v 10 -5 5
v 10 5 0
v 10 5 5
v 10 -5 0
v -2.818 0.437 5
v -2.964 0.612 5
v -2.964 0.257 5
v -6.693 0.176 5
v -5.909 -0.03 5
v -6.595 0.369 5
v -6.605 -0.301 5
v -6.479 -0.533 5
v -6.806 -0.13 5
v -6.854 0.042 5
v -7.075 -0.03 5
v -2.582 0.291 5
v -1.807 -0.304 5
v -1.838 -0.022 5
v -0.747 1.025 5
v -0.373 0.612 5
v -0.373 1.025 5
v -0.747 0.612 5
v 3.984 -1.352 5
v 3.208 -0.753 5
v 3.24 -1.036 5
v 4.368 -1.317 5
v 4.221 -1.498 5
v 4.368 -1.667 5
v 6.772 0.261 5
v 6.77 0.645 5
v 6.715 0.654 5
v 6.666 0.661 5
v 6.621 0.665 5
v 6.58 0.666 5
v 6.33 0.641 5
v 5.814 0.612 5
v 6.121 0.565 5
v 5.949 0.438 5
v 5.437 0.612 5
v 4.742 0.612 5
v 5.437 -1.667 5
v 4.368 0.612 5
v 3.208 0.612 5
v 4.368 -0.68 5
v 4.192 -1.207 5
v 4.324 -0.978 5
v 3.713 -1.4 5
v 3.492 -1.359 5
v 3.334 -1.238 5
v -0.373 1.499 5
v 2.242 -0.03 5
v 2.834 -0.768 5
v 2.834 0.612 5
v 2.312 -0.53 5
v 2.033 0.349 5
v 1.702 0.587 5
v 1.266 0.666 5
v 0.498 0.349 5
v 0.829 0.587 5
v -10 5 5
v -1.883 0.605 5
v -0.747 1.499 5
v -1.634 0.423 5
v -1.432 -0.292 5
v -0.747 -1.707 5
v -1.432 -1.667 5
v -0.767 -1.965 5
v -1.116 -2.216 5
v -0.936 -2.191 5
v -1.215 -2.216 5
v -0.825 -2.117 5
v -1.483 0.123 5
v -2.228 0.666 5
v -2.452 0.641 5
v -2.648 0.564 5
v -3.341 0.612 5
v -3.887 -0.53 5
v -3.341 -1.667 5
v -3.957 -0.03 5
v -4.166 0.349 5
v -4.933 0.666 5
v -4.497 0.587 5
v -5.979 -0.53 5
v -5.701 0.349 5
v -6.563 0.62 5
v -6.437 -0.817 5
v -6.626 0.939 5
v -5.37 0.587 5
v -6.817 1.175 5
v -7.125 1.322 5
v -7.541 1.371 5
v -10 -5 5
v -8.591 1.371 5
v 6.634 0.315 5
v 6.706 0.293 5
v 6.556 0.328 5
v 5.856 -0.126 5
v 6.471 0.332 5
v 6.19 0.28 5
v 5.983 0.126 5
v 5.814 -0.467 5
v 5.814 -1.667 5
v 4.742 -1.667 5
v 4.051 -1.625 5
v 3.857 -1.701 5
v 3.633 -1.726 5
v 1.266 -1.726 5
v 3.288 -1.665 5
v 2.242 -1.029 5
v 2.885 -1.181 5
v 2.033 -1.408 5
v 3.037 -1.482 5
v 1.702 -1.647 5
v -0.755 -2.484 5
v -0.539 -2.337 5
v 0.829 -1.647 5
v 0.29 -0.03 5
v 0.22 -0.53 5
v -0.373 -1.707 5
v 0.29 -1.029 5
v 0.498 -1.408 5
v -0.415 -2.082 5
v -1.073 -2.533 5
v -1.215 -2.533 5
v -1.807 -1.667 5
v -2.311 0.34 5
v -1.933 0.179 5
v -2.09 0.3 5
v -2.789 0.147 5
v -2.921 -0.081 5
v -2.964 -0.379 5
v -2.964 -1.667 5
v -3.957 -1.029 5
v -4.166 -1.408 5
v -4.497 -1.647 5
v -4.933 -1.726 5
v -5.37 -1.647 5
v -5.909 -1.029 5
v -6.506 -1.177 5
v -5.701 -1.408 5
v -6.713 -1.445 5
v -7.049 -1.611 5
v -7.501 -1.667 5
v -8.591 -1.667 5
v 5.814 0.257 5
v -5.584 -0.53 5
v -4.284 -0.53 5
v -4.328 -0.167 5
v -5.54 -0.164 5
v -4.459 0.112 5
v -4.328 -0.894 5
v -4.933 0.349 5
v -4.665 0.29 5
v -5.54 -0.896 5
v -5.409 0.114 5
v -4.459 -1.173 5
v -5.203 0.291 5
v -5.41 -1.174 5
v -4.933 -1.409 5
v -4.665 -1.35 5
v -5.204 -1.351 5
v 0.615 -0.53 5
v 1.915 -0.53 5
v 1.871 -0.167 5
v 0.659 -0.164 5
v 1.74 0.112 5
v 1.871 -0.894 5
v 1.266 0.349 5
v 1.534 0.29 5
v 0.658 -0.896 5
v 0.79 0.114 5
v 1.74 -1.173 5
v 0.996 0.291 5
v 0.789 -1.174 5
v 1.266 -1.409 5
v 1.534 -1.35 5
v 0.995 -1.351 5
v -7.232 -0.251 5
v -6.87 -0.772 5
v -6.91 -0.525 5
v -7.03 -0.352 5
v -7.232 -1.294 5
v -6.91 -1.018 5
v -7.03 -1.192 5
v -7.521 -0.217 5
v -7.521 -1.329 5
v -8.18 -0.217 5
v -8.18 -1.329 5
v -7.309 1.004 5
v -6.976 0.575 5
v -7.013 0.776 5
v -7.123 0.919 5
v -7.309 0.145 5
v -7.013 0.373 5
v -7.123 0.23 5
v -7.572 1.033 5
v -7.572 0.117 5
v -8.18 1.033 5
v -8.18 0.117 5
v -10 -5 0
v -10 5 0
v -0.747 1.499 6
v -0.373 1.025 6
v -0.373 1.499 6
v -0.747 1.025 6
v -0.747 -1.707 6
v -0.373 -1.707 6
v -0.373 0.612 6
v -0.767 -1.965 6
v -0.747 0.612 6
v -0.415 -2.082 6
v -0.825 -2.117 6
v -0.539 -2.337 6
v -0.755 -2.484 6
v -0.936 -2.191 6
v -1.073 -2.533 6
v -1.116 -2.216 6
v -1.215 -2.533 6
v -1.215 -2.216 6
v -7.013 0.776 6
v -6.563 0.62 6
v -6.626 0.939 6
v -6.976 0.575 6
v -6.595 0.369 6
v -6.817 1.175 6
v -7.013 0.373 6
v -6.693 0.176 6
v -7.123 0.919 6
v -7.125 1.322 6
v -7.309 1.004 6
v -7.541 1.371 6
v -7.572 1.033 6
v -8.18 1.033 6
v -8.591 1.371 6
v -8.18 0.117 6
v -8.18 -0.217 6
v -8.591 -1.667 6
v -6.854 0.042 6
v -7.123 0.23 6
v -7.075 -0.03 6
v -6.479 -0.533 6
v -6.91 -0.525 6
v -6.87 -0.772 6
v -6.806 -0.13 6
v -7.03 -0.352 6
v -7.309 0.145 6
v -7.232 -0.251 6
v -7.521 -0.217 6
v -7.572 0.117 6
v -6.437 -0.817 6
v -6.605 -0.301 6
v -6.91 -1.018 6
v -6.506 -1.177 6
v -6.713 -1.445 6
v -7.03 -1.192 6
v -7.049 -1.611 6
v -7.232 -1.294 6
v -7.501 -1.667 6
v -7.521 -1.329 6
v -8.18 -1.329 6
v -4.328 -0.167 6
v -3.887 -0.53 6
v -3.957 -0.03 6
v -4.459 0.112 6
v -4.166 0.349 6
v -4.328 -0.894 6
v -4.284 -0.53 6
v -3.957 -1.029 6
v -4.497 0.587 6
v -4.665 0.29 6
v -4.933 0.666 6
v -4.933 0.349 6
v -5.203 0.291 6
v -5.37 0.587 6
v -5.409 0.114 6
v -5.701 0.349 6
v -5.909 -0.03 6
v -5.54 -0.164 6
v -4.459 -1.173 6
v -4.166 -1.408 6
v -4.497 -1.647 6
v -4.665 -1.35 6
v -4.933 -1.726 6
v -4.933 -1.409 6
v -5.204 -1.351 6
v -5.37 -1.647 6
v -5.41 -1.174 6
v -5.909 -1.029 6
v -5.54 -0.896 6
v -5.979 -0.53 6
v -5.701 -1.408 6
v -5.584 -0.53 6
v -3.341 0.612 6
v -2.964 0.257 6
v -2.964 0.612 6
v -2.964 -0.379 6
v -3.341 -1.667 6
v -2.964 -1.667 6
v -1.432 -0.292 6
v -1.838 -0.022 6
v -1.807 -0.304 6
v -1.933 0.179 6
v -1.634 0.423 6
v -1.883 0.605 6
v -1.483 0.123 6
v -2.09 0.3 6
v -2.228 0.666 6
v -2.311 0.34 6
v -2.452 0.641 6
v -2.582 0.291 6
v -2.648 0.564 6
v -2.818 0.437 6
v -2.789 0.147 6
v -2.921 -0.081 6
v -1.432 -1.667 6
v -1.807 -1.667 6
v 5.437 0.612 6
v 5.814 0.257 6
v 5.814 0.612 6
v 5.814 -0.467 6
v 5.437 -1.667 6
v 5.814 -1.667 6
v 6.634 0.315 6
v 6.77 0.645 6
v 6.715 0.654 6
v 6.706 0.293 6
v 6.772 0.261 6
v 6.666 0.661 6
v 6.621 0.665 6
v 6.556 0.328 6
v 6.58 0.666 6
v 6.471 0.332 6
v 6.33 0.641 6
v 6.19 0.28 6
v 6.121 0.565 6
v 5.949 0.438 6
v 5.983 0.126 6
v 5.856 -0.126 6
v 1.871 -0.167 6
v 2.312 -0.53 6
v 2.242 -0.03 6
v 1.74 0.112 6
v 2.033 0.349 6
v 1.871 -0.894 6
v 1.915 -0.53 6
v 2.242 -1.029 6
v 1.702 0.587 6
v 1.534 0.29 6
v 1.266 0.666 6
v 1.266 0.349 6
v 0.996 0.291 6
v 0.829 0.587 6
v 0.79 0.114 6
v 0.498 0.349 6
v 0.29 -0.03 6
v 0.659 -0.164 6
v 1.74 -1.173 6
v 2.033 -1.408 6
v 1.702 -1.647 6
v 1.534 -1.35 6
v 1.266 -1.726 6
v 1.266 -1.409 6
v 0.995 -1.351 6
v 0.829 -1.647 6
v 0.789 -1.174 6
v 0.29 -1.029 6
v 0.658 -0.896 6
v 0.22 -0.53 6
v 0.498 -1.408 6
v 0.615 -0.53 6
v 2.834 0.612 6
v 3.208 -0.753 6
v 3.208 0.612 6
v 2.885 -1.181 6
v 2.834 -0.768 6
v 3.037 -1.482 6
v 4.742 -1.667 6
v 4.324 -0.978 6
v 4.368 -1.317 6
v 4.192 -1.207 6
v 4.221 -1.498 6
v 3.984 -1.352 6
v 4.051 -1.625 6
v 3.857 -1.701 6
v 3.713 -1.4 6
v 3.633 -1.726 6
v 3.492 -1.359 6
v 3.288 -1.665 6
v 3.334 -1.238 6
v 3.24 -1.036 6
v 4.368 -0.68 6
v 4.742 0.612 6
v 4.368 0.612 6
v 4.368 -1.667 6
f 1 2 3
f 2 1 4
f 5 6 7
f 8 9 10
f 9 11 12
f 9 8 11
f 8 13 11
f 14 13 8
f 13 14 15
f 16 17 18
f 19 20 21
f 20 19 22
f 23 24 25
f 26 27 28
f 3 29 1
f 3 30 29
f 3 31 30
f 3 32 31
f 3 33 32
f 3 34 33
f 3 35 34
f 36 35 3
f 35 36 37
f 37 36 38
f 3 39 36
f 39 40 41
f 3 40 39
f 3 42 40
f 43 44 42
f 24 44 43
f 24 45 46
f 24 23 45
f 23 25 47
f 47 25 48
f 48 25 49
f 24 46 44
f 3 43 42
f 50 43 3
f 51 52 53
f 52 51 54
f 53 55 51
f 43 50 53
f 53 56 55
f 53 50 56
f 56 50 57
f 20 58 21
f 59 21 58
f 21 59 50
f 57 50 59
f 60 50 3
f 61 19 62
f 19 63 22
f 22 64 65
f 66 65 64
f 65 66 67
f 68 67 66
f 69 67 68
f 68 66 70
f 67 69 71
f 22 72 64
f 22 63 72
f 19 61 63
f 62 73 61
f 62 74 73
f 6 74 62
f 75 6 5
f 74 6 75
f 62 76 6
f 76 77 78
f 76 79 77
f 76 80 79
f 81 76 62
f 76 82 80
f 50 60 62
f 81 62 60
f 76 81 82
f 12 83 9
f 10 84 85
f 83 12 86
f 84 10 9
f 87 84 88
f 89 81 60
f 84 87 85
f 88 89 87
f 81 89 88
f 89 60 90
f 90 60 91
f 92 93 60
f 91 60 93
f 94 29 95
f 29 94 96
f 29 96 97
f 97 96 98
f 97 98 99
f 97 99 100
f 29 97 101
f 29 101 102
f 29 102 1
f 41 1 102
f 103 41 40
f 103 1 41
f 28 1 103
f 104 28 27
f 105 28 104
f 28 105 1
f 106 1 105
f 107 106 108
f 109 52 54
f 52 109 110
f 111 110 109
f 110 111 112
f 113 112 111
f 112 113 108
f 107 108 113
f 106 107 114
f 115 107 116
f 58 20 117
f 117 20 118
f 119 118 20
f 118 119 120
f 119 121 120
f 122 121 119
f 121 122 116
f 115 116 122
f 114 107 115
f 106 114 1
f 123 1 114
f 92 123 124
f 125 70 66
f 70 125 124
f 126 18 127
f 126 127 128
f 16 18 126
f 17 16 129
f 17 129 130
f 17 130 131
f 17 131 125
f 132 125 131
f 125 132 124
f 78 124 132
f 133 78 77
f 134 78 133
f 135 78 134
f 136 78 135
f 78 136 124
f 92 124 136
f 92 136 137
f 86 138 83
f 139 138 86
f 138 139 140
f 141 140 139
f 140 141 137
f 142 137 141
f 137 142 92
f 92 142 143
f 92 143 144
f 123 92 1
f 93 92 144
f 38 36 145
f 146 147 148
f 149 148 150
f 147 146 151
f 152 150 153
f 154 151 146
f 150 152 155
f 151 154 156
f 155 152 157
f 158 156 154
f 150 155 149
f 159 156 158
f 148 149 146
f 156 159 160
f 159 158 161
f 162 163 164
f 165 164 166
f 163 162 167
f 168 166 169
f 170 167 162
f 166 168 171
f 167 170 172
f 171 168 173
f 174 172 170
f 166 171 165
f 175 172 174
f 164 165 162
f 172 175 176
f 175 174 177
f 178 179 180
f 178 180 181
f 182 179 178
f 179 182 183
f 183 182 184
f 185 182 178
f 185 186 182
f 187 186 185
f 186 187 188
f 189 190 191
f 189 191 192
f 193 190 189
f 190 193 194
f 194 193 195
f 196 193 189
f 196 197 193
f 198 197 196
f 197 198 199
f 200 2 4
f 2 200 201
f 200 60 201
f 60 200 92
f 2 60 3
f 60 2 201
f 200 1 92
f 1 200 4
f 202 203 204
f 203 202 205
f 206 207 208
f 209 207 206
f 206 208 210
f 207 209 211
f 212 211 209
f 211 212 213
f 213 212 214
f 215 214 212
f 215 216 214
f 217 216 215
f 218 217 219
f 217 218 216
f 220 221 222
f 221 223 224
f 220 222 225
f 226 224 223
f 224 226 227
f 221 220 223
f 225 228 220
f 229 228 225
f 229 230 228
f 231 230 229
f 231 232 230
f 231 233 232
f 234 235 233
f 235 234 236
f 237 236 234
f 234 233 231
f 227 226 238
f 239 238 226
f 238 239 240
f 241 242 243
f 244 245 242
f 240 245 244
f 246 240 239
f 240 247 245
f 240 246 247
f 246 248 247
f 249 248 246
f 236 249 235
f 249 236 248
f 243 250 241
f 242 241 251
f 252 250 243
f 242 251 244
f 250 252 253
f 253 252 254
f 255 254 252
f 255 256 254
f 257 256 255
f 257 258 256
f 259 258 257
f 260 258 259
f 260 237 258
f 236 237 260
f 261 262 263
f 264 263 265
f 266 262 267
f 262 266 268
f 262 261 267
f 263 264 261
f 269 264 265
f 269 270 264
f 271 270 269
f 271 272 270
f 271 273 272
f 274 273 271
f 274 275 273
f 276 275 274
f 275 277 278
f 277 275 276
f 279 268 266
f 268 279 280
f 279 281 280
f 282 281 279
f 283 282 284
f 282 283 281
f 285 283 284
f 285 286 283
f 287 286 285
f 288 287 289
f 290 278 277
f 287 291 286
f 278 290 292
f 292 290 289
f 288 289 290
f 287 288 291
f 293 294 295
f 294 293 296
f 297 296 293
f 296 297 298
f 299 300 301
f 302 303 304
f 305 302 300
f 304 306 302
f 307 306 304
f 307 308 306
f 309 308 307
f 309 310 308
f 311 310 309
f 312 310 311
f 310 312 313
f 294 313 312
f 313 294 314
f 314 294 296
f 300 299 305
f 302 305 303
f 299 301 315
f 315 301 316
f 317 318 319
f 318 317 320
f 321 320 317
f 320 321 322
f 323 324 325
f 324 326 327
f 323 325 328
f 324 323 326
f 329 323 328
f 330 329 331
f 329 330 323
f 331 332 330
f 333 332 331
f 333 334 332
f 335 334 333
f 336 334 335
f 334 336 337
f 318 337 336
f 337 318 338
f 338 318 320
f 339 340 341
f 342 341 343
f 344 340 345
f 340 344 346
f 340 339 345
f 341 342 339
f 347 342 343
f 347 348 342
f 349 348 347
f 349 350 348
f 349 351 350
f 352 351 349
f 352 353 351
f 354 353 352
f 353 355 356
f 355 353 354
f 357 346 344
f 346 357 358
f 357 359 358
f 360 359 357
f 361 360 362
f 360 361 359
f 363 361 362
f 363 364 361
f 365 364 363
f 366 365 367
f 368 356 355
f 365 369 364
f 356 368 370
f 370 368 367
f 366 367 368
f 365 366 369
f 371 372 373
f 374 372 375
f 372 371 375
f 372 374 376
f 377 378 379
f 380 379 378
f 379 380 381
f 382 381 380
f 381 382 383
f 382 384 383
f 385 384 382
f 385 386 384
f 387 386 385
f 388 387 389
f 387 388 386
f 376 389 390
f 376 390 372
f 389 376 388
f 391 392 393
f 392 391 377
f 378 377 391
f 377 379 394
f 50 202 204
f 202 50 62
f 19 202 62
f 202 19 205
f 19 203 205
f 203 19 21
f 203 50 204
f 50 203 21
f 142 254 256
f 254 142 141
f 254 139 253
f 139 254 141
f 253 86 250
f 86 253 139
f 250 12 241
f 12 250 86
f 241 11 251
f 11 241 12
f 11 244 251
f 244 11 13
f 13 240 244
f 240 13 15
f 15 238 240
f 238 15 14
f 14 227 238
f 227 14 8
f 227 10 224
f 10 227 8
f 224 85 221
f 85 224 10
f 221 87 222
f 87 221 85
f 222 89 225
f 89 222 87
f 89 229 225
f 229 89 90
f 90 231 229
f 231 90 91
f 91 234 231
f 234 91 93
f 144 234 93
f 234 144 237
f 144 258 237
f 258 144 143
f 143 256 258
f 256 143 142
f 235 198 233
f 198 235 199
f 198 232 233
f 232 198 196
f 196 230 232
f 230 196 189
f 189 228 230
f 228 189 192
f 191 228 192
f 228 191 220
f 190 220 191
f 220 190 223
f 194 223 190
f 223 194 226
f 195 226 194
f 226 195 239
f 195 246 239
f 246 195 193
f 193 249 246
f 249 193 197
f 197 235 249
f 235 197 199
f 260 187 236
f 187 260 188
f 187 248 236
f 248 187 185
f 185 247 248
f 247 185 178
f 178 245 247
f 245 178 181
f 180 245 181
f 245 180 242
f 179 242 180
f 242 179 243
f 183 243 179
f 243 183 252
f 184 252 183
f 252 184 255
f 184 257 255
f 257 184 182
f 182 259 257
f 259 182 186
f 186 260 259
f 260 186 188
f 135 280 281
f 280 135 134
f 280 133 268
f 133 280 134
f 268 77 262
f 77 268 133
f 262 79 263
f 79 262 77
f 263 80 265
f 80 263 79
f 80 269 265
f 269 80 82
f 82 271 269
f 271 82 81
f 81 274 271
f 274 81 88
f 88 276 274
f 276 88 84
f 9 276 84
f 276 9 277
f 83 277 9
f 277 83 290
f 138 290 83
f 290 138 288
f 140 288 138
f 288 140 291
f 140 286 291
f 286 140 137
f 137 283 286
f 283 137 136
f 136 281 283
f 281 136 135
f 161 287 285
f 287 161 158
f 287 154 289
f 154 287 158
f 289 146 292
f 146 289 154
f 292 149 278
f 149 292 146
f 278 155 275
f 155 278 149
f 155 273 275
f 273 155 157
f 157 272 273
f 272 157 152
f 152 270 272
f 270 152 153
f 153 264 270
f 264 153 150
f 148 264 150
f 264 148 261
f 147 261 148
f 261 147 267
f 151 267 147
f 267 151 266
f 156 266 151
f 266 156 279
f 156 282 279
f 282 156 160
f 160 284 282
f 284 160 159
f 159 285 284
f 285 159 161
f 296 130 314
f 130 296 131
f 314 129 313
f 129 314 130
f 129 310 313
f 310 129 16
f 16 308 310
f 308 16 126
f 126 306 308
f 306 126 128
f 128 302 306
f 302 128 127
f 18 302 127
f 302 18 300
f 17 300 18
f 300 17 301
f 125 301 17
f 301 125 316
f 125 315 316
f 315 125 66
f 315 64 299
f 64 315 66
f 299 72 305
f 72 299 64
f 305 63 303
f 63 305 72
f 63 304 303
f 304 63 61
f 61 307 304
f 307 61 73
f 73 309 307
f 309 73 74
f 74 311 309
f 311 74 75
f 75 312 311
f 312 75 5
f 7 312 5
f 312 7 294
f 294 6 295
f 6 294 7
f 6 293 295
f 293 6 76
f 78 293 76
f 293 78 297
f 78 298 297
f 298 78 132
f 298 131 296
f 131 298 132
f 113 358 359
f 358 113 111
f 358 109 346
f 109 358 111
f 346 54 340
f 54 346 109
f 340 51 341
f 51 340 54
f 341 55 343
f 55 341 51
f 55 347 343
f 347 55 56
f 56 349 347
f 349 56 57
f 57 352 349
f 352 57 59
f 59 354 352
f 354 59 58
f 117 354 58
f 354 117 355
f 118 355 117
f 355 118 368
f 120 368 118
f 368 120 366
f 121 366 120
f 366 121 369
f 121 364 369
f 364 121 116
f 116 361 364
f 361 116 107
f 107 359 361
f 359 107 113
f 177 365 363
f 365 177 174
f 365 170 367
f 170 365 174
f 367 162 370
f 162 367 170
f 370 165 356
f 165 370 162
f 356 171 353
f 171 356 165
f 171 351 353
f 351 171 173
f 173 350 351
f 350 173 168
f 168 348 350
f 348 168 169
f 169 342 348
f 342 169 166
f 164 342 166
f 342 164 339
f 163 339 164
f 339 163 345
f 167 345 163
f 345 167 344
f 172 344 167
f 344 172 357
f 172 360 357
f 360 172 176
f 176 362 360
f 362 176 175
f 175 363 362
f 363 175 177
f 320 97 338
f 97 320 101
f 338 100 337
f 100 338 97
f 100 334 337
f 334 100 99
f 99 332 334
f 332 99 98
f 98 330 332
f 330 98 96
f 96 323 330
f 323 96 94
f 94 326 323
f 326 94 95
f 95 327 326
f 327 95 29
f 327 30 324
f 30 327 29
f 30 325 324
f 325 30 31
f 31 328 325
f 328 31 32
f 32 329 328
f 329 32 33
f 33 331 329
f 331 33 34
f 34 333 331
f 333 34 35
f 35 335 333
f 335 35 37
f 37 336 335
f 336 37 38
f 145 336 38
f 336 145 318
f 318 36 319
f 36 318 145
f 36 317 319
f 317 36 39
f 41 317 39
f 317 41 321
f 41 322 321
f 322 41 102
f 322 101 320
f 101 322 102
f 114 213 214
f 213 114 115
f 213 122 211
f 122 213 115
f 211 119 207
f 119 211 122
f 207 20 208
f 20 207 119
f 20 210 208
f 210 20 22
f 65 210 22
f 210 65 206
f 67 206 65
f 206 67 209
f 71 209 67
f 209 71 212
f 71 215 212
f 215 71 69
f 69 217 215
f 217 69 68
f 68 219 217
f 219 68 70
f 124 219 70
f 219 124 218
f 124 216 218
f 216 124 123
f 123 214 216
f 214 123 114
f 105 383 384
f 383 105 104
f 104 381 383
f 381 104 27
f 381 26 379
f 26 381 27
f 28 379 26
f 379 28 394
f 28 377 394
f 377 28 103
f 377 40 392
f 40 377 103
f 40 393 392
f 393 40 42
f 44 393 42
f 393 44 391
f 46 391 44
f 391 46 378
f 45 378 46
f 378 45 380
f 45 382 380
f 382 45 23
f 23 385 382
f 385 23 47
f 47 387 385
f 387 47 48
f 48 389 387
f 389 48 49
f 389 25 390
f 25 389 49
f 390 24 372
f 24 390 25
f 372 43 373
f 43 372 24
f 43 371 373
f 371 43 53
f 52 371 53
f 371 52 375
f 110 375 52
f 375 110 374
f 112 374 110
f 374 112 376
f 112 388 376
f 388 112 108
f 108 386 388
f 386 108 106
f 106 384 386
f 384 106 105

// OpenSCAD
$fn = 10; 
texte_a_inserer = "Bonjour"; 
taille = 3; 
police = "DejaVuSans"; //[[Abril Fatface,Aclonica,Acme,Advent Pro,Akronim,Aladin,Alegreya,Alegreya Sans,Alegreya SC,Alex Brush,Alfa Slab One,Alice,Amaranth,Architects Daughter,Archivo Black,Archivo Narrow,Arimo,Arvo,Asap,Astloch,Asul,Averia Libre,Averia Serif Libre,Bangers,Basic,Belgrano,Berkshire Swash,Bigshot One,Bilbo Swash Caps,Black Ops One,Bonbon,Bowlby One SC,Brawler,Bubblegum Sans,Butterfly Kids,Cabin Condensed,Caesar Dressing,Cagliostro,Calligraffitti,Capriola,Carter One,Changa One,Chango,Chelsea Market,Cherry Cream Soda,Chewy,Chicle,Chivo,Clicker Script,Coming Soon,Concert One,Condiment,Cookie,Courgette,Covered By Your Grace,Crimson Text,Dancing Script,DejaVu Sans,DejaVu Serif,Dhurjati,Doppio One,Dosis,Droid Sans,Eagle Lake,Electrolize,Emilys Candy,Encode Sans,Encode Sans Compressed,Euphoria Script,Exo,Exo 2,Faster One,Federo,Finger Paint,Fjord One,Fontdiner Swanky,Freckle Face,Fruktur,Gabriela,Geo,Germania One,Give You Glory,Gloria Hallelujah,Goudy Bookletter 1911,Graduate,Grand Hotel,Great Vibes,Griffy,Hanalei Fill,Happy Monkey,Henny Penny,Hind,IM Fell English SC,Indie Flower,Irish Grover,Italianno,Jacques Francois Shadow,Jolly Lodger,Josefin Slab,Joti One,Judson,Just Another Hand,Kalam,Kameron,Karma,Kavoon,Knewave,Kranky,Kristi,Laila,Lakki Reddy,Lancelot,Lato,Leckerli One,Ledger,Lekton,Lemon One,Liberation Sans,Libre Caslon Text,Life Savers,Lilita One,Lily Script One,Limelight,Lobster,Lobster Two,Londrina Outline,Londrina Shadow,Londrina Solid,Lora,Love Ya Like A Sister,Loved by the King,Lovers Quarrel,Luckiest Guy,Lusitana,Macondo,Macondo Swash Caps,Mako,Marck Script,Margarine,Marko One,Maven Pro,McLaren,MedievalSharp,Merienda One,Merriweather,Mervale Script,Metal Mania,Metrophobic,Milonga,Miltonian Tattoo,Miss Fajardose,Molle,Montez,Montserrat,Mr De Haviland,Mystery Quest,Neucha,New Rocker,Niconne,Nosifer,Nothing You Could Do,Noto Sans Oriya,Noto Serif,Nova Square,Nunito,Old Standard TT,Oleo Script,Oleo Script Swash Caps,Orbitron,Oregano,Orienta,Original Surfer,Oswald,Over the Rainbow,Overlock,Oxygen,Pacifico,Paprika,Parisienne,Patrick Hand SC,Paytone One,Peralta,Permanent Marker,Piedra,Pirata One,Play,Playball,Poetsen One,Poppins,Press Start 2P,Princess Sofia,PT Mono,Qwigley,Racing Sans One,Raleway,Rancho,Ranga,Ribeye,Roboto,Roboto Condensed,Roboto Slab,Rochester,Rock Salt,Rubik One,Sail,Salsa,Sansita One,Sarina,Satisfy,Schoolbell,Seaweed Script,Sevillana,Shadows Into Light,Shadows Into Light Two,Share,Six Caps,Skranji,Source Sans Pro,Spicy Rice,Stardos Stencil,Stoke,Syncopate,Teko,Terminal Dosis,The Girl Next Door,Tillana,Timmana,Titillium Web,Ubuntu,Ultra,Underdog,UnifrakturCook,UnifrakturMaguntia,Vampiro One,Vidaloka,Viga,Voces,Volkhov,Vollkorn,Voltaire,Waiting for the Sunrise,Wallpoet,Wellfleet,Wendy One,Yellowtail,Yesteryear,Zeyada]]
hauteur = 1; 
longueur_cube = 20; 
largeur_cube = 10; 
hauteur_cube = 5; 
// relief = relief  extrusion = extru
relief = "relief"; //[relief,extru]
module rendu(){
linear_extrude(hauteur) text(texte_a_inserer,size = taille, font = police);
}
module finao(){
if ( relief== "relief") {
   union(){
 translate([0,0,0])   cube([longueur_cube,largeur_cube,hauteur_cube]);
translate([1,(largeur_cube/3),hauteur_cube]) rendu();
   } 
}
else
{
difference(){
 translate([0,0,0])   cube([longueur_cube,largeur_cube,hauteur_cube]);
translate([1,(largeur_cube/3),(hauteur_cube -hauteur+0.1)]) rendu();
}
 }
}
translate ([-(longueur_cube/2),-(largeur_cube/2),0]) finao();
